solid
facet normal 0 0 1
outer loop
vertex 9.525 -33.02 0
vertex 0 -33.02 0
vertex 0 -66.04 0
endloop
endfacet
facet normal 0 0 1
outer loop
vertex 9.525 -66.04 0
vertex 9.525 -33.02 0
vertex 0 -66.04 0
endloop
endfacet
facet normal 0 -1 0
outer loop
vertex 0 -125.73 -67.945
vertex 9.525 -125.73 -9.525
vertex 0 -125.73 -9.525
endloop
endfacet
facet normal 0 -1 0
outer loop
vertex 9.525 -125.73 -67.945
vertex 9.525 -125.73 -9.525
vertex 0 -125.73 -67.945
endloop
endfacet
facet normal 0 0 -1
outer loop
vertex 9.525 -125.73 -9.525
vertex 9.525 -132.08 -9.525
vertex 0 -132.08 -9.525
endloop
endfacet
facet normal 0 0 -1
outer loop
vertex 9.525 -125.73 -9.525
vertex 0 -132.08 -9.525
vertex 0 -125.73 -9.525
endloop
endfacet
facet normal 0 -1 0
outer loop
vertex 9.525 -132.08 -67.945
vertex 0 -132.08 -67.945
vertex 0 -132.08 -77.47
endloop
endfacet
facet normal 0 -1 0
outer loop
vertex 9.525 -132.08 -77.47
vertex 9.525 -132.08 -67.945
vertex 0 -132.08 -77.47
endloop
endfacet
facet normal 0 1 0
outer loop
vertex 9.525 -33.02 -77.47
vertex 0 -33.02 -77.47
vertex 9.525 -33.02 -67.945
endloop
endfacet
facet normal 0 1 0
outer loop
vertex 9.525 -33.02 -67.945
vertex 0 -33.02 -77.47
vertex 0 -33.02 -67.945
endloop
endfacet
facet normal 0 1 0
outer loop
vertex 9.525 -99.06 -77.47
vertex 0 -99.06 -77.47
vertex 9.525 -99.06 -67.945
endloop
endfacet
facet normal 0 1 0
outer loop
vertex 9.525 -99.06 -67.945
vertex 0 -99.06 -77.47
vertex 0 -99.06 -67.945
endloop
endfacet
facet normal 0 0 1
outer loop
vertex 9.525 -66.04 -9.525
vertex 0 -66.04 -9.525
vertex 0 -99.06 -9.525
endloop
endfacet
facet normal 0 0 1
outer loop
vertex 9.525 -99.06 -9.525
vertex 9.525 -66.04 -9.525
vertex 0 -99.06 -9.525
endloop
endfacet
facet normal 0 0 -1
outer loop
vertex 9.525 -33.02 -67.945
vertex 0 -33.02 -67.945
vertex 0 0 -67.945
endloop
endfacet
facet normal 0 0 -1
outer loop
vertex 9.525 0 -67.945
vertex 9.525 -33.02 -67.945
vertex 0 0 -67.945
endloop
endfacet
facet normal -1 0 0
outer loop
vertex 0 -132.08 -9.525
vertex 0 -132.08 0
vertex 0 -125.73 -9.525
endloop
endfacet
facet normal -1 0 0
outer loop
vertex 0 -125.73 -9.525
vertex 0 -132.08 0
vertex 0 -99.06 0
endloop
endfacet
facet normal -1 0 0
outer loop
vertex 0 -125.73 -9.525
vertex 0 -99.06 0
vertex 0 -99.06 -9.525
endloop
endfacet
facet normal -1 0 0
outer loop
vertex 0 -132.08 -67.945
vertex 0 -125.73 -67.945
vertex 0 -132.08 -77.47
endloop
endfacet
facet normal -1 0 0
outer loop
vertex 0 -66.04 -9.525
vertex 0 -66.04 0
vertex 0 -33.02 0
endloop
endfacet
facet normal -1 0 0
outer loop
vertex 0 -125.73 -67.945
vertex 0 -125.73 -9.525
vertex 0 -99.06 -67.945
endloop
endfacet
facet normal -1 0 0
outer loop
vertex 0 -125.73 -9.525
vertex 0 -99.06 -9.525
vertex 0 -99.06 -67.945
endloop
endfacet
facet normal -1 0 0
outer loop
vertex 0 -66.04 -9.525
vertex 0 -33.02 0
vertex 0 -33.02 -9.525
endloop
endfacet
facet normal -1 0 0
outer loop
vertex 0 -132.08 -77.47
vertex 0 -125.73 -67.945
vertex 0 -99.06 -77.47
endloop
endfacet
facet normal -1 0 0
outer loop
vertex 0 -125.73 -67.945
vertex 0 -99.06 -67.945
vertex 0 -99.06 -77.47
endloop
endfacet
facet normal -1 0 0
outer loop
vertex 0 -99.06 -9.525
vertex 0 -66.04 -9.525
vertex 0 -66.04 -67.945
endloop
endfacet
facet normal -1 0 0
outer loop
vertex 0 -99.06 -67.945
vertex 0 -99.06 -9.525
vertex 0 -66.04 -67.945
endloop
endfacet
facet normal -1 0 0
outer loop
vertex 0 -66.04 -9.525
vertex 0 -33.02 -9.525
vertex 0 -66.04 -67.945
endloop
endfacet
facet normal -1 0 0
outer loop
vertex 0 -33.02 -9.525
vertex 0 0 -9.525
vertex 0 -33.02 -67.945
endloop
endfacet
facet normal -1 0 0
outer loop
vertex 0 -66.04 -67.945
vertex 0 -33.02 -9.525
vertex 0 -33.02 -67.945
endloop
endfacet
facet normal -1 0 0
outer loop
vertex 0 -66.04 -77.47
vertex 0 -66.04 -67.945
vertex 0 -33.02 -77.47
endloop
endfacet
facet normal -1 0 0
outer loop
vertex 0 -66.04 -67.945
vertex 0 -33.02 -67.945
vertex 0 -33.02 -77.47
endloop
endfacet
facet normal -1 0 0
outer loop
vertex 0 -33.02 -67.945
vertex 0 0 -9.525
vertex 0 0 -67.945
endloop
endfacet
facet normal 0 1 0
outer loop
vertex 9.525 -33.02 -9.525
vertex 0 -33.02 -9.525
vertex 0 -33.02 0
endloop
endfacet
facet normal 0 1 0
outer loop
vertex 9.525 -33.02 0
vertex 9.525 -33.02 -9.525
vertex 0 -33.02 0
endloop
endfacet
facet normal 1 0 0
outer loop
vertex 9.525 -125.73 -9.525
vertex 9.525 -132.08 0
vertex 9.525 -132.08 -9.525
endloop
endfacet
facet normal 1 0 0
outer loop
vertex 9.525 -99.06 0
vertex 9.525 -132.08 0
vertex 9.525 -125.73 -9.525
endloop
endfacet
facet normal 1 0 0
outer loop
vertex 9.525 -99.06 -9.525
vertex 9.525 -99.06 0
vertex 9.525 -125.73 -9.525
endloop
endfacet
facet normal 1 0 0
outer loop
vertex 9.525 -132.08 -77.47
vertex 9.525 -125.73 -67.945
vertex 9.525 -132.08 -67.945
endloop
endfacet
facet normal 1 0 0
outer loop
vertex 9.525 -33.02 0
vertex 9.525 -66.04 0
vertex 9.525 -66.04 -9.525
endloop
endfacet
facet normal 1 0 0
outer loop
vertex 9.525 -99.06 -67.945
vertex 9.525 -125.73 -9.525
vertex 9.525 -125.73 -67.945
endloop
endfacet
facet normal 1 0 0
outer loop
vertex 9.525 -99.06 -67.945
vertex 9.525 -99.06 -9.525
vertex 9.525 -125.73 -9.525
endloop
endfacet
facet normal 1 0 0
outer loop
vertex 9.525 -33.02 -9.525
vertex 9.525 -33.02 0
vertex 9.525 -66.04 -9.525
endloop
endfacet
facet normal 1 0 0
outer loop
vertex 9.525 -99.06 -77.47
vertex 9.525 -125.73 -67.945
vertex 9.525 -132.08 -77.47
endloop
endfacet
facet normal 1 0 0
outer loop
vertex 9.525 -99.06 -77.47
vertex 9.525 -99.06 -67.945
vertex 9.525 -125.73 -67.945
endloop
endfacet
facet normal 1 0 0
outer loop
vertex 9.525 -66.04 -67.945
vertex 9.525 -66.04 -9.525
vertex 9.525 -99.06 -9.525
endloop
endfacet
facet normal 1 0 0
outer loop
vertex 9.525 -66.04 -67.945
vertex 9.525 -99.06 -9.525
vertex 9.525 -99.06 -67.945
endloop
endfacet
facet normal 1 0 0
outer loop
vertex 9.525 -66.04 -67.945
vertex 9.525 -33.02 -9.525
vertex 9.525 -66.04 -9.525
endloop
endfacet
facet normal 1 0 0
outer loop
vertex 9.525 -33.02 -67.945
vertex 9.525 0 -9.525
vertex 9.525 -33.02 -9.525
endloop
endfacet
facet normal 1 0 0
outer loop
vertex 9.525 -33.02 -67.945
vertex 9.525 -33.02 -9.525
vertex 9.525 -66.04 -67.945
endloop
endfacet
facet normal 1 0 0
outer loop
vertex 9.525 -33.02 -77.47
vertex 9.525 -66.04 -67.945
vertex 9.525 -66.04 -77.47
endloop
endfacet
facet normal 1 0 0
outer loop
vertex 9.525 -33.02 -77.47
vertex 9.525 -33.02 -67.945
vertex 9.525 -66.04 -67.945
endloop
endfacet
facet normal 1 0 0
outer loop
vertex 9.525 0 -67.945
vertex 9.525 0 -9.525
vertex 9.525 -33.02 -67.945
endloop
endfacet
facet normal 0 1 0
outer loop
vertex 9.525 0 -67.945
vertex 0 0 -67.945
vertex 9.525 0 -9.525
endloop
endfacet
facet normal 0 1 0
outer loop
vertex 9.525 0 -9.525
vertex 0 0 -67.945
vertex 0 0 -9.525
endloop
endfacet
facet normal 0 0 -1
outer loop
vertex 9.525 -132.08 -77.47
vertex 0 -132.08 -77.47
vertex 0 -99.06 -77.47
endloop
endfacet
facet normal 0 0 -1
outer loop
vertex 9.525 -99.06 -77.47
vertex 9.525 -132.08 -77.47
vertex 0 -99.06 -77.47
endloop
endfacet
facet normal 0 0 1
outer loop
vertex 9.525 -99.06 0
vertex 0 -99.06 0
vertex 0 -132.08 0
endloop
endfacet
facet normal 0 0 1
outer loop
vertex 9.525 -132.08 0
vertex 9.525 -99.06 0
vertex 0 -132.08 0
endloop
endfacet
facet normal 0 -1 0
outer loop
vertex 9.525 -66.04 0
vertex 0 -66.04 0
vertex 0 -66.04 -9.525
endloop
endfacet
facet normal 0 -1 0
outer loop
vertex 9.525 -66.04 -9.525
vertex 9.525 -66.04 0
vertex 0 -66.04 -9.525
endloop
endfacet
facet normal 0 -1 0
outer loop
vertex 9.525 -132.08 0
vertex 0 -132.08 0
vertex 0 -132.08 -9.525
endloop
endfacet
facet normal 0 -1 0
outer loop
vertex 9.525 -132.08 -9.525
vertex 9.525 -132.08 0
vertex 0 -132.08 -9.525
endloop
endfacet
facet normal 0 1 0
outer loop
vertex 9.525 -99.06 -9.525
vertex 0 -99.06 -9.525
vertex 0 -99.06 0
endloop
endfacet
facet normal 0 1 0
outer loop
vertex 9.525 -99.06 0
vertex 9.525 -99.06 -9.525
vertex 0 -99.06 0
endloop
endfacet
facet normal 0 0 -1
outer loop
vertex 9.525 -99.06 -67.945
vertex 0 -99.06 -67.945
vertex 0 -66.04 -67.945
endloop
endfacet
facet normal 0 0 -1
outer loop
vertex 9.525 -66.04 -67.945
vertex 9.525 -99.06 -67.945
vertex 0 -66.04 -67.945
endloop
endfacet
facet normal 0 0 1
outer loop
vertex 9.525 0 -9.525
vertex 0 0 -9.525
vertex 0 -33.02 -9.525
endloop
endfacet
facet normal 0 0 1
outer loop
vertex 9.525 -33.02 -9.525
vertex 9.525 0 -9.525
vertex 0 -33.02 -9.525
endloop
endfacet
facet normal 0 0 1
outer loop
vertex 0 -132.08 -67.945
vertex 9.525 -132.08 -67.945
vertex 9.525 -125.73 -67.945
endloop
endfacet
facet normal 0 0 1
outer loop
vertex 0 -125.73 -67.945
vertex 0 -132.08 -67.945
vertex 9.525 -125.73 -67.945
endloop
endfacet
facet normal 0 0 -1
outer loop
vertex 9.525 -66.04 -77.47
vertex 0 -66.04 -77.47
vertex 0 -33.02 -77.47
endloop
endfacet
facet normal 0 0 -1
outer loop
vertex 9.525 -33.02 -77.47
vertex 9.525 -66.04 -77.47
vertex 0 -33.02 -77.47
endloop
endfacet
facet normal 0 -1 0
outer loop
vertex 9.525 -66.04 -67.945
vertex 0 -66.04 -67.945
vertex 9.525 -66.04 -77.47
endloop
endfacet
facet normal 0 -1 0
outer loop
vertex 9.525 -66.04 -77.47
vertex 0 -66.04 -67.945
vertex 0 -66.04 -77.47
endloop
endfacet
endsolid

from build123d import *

# Parameters (mm, degrees)
BOSS_EXTRUDE1_DEPTH = 9.525
SKETCH2_W           = 58.42
SKETCH2_H           = 6.35
CUT_EXTRUDE1_DEPTH  = 46.99


with BuildPart() as part:
    # Sketch1 → Boss-Extrude1 (new body)
    with BuildSketch(Plane(origin=(0, 0, 0), x_dir=(0, 0, -1), z_dir=(1, 0, 0))):
        Polygon((9.525, -99.06), (0, -99.06), (0, -132.08), (77.47, -132.08), (77.47, -99.06), (67.945, -99.06), (67.945, -66.04), (77.47, -66.04), (77.47, -33.02), (67.945, -33.02), (67.945, 0), (9.525, 0), (9.525, -33.02), (0, -33.02), (0, -66.04), (9.525, -66.04), align=None)
    extrude(amount=BOSS_EXTRUDE1_DEPTH)

    # Sketch2 → Cut-Extrude1 (cut)
    with BuildSketch(Plane(origin=(9.525, 0, 0), x_dir=(0, 0, -1), z_dir=(1, 0, 0))):
        with Locations((38.735, -128.905)):
            Rectangle(SKETCH2_W, SKETCH2_H)
    extrude(amount=-CUT_EXTRUDE1_DEPTH, mode=Mode.SUBTRACT)


solid = part.part
